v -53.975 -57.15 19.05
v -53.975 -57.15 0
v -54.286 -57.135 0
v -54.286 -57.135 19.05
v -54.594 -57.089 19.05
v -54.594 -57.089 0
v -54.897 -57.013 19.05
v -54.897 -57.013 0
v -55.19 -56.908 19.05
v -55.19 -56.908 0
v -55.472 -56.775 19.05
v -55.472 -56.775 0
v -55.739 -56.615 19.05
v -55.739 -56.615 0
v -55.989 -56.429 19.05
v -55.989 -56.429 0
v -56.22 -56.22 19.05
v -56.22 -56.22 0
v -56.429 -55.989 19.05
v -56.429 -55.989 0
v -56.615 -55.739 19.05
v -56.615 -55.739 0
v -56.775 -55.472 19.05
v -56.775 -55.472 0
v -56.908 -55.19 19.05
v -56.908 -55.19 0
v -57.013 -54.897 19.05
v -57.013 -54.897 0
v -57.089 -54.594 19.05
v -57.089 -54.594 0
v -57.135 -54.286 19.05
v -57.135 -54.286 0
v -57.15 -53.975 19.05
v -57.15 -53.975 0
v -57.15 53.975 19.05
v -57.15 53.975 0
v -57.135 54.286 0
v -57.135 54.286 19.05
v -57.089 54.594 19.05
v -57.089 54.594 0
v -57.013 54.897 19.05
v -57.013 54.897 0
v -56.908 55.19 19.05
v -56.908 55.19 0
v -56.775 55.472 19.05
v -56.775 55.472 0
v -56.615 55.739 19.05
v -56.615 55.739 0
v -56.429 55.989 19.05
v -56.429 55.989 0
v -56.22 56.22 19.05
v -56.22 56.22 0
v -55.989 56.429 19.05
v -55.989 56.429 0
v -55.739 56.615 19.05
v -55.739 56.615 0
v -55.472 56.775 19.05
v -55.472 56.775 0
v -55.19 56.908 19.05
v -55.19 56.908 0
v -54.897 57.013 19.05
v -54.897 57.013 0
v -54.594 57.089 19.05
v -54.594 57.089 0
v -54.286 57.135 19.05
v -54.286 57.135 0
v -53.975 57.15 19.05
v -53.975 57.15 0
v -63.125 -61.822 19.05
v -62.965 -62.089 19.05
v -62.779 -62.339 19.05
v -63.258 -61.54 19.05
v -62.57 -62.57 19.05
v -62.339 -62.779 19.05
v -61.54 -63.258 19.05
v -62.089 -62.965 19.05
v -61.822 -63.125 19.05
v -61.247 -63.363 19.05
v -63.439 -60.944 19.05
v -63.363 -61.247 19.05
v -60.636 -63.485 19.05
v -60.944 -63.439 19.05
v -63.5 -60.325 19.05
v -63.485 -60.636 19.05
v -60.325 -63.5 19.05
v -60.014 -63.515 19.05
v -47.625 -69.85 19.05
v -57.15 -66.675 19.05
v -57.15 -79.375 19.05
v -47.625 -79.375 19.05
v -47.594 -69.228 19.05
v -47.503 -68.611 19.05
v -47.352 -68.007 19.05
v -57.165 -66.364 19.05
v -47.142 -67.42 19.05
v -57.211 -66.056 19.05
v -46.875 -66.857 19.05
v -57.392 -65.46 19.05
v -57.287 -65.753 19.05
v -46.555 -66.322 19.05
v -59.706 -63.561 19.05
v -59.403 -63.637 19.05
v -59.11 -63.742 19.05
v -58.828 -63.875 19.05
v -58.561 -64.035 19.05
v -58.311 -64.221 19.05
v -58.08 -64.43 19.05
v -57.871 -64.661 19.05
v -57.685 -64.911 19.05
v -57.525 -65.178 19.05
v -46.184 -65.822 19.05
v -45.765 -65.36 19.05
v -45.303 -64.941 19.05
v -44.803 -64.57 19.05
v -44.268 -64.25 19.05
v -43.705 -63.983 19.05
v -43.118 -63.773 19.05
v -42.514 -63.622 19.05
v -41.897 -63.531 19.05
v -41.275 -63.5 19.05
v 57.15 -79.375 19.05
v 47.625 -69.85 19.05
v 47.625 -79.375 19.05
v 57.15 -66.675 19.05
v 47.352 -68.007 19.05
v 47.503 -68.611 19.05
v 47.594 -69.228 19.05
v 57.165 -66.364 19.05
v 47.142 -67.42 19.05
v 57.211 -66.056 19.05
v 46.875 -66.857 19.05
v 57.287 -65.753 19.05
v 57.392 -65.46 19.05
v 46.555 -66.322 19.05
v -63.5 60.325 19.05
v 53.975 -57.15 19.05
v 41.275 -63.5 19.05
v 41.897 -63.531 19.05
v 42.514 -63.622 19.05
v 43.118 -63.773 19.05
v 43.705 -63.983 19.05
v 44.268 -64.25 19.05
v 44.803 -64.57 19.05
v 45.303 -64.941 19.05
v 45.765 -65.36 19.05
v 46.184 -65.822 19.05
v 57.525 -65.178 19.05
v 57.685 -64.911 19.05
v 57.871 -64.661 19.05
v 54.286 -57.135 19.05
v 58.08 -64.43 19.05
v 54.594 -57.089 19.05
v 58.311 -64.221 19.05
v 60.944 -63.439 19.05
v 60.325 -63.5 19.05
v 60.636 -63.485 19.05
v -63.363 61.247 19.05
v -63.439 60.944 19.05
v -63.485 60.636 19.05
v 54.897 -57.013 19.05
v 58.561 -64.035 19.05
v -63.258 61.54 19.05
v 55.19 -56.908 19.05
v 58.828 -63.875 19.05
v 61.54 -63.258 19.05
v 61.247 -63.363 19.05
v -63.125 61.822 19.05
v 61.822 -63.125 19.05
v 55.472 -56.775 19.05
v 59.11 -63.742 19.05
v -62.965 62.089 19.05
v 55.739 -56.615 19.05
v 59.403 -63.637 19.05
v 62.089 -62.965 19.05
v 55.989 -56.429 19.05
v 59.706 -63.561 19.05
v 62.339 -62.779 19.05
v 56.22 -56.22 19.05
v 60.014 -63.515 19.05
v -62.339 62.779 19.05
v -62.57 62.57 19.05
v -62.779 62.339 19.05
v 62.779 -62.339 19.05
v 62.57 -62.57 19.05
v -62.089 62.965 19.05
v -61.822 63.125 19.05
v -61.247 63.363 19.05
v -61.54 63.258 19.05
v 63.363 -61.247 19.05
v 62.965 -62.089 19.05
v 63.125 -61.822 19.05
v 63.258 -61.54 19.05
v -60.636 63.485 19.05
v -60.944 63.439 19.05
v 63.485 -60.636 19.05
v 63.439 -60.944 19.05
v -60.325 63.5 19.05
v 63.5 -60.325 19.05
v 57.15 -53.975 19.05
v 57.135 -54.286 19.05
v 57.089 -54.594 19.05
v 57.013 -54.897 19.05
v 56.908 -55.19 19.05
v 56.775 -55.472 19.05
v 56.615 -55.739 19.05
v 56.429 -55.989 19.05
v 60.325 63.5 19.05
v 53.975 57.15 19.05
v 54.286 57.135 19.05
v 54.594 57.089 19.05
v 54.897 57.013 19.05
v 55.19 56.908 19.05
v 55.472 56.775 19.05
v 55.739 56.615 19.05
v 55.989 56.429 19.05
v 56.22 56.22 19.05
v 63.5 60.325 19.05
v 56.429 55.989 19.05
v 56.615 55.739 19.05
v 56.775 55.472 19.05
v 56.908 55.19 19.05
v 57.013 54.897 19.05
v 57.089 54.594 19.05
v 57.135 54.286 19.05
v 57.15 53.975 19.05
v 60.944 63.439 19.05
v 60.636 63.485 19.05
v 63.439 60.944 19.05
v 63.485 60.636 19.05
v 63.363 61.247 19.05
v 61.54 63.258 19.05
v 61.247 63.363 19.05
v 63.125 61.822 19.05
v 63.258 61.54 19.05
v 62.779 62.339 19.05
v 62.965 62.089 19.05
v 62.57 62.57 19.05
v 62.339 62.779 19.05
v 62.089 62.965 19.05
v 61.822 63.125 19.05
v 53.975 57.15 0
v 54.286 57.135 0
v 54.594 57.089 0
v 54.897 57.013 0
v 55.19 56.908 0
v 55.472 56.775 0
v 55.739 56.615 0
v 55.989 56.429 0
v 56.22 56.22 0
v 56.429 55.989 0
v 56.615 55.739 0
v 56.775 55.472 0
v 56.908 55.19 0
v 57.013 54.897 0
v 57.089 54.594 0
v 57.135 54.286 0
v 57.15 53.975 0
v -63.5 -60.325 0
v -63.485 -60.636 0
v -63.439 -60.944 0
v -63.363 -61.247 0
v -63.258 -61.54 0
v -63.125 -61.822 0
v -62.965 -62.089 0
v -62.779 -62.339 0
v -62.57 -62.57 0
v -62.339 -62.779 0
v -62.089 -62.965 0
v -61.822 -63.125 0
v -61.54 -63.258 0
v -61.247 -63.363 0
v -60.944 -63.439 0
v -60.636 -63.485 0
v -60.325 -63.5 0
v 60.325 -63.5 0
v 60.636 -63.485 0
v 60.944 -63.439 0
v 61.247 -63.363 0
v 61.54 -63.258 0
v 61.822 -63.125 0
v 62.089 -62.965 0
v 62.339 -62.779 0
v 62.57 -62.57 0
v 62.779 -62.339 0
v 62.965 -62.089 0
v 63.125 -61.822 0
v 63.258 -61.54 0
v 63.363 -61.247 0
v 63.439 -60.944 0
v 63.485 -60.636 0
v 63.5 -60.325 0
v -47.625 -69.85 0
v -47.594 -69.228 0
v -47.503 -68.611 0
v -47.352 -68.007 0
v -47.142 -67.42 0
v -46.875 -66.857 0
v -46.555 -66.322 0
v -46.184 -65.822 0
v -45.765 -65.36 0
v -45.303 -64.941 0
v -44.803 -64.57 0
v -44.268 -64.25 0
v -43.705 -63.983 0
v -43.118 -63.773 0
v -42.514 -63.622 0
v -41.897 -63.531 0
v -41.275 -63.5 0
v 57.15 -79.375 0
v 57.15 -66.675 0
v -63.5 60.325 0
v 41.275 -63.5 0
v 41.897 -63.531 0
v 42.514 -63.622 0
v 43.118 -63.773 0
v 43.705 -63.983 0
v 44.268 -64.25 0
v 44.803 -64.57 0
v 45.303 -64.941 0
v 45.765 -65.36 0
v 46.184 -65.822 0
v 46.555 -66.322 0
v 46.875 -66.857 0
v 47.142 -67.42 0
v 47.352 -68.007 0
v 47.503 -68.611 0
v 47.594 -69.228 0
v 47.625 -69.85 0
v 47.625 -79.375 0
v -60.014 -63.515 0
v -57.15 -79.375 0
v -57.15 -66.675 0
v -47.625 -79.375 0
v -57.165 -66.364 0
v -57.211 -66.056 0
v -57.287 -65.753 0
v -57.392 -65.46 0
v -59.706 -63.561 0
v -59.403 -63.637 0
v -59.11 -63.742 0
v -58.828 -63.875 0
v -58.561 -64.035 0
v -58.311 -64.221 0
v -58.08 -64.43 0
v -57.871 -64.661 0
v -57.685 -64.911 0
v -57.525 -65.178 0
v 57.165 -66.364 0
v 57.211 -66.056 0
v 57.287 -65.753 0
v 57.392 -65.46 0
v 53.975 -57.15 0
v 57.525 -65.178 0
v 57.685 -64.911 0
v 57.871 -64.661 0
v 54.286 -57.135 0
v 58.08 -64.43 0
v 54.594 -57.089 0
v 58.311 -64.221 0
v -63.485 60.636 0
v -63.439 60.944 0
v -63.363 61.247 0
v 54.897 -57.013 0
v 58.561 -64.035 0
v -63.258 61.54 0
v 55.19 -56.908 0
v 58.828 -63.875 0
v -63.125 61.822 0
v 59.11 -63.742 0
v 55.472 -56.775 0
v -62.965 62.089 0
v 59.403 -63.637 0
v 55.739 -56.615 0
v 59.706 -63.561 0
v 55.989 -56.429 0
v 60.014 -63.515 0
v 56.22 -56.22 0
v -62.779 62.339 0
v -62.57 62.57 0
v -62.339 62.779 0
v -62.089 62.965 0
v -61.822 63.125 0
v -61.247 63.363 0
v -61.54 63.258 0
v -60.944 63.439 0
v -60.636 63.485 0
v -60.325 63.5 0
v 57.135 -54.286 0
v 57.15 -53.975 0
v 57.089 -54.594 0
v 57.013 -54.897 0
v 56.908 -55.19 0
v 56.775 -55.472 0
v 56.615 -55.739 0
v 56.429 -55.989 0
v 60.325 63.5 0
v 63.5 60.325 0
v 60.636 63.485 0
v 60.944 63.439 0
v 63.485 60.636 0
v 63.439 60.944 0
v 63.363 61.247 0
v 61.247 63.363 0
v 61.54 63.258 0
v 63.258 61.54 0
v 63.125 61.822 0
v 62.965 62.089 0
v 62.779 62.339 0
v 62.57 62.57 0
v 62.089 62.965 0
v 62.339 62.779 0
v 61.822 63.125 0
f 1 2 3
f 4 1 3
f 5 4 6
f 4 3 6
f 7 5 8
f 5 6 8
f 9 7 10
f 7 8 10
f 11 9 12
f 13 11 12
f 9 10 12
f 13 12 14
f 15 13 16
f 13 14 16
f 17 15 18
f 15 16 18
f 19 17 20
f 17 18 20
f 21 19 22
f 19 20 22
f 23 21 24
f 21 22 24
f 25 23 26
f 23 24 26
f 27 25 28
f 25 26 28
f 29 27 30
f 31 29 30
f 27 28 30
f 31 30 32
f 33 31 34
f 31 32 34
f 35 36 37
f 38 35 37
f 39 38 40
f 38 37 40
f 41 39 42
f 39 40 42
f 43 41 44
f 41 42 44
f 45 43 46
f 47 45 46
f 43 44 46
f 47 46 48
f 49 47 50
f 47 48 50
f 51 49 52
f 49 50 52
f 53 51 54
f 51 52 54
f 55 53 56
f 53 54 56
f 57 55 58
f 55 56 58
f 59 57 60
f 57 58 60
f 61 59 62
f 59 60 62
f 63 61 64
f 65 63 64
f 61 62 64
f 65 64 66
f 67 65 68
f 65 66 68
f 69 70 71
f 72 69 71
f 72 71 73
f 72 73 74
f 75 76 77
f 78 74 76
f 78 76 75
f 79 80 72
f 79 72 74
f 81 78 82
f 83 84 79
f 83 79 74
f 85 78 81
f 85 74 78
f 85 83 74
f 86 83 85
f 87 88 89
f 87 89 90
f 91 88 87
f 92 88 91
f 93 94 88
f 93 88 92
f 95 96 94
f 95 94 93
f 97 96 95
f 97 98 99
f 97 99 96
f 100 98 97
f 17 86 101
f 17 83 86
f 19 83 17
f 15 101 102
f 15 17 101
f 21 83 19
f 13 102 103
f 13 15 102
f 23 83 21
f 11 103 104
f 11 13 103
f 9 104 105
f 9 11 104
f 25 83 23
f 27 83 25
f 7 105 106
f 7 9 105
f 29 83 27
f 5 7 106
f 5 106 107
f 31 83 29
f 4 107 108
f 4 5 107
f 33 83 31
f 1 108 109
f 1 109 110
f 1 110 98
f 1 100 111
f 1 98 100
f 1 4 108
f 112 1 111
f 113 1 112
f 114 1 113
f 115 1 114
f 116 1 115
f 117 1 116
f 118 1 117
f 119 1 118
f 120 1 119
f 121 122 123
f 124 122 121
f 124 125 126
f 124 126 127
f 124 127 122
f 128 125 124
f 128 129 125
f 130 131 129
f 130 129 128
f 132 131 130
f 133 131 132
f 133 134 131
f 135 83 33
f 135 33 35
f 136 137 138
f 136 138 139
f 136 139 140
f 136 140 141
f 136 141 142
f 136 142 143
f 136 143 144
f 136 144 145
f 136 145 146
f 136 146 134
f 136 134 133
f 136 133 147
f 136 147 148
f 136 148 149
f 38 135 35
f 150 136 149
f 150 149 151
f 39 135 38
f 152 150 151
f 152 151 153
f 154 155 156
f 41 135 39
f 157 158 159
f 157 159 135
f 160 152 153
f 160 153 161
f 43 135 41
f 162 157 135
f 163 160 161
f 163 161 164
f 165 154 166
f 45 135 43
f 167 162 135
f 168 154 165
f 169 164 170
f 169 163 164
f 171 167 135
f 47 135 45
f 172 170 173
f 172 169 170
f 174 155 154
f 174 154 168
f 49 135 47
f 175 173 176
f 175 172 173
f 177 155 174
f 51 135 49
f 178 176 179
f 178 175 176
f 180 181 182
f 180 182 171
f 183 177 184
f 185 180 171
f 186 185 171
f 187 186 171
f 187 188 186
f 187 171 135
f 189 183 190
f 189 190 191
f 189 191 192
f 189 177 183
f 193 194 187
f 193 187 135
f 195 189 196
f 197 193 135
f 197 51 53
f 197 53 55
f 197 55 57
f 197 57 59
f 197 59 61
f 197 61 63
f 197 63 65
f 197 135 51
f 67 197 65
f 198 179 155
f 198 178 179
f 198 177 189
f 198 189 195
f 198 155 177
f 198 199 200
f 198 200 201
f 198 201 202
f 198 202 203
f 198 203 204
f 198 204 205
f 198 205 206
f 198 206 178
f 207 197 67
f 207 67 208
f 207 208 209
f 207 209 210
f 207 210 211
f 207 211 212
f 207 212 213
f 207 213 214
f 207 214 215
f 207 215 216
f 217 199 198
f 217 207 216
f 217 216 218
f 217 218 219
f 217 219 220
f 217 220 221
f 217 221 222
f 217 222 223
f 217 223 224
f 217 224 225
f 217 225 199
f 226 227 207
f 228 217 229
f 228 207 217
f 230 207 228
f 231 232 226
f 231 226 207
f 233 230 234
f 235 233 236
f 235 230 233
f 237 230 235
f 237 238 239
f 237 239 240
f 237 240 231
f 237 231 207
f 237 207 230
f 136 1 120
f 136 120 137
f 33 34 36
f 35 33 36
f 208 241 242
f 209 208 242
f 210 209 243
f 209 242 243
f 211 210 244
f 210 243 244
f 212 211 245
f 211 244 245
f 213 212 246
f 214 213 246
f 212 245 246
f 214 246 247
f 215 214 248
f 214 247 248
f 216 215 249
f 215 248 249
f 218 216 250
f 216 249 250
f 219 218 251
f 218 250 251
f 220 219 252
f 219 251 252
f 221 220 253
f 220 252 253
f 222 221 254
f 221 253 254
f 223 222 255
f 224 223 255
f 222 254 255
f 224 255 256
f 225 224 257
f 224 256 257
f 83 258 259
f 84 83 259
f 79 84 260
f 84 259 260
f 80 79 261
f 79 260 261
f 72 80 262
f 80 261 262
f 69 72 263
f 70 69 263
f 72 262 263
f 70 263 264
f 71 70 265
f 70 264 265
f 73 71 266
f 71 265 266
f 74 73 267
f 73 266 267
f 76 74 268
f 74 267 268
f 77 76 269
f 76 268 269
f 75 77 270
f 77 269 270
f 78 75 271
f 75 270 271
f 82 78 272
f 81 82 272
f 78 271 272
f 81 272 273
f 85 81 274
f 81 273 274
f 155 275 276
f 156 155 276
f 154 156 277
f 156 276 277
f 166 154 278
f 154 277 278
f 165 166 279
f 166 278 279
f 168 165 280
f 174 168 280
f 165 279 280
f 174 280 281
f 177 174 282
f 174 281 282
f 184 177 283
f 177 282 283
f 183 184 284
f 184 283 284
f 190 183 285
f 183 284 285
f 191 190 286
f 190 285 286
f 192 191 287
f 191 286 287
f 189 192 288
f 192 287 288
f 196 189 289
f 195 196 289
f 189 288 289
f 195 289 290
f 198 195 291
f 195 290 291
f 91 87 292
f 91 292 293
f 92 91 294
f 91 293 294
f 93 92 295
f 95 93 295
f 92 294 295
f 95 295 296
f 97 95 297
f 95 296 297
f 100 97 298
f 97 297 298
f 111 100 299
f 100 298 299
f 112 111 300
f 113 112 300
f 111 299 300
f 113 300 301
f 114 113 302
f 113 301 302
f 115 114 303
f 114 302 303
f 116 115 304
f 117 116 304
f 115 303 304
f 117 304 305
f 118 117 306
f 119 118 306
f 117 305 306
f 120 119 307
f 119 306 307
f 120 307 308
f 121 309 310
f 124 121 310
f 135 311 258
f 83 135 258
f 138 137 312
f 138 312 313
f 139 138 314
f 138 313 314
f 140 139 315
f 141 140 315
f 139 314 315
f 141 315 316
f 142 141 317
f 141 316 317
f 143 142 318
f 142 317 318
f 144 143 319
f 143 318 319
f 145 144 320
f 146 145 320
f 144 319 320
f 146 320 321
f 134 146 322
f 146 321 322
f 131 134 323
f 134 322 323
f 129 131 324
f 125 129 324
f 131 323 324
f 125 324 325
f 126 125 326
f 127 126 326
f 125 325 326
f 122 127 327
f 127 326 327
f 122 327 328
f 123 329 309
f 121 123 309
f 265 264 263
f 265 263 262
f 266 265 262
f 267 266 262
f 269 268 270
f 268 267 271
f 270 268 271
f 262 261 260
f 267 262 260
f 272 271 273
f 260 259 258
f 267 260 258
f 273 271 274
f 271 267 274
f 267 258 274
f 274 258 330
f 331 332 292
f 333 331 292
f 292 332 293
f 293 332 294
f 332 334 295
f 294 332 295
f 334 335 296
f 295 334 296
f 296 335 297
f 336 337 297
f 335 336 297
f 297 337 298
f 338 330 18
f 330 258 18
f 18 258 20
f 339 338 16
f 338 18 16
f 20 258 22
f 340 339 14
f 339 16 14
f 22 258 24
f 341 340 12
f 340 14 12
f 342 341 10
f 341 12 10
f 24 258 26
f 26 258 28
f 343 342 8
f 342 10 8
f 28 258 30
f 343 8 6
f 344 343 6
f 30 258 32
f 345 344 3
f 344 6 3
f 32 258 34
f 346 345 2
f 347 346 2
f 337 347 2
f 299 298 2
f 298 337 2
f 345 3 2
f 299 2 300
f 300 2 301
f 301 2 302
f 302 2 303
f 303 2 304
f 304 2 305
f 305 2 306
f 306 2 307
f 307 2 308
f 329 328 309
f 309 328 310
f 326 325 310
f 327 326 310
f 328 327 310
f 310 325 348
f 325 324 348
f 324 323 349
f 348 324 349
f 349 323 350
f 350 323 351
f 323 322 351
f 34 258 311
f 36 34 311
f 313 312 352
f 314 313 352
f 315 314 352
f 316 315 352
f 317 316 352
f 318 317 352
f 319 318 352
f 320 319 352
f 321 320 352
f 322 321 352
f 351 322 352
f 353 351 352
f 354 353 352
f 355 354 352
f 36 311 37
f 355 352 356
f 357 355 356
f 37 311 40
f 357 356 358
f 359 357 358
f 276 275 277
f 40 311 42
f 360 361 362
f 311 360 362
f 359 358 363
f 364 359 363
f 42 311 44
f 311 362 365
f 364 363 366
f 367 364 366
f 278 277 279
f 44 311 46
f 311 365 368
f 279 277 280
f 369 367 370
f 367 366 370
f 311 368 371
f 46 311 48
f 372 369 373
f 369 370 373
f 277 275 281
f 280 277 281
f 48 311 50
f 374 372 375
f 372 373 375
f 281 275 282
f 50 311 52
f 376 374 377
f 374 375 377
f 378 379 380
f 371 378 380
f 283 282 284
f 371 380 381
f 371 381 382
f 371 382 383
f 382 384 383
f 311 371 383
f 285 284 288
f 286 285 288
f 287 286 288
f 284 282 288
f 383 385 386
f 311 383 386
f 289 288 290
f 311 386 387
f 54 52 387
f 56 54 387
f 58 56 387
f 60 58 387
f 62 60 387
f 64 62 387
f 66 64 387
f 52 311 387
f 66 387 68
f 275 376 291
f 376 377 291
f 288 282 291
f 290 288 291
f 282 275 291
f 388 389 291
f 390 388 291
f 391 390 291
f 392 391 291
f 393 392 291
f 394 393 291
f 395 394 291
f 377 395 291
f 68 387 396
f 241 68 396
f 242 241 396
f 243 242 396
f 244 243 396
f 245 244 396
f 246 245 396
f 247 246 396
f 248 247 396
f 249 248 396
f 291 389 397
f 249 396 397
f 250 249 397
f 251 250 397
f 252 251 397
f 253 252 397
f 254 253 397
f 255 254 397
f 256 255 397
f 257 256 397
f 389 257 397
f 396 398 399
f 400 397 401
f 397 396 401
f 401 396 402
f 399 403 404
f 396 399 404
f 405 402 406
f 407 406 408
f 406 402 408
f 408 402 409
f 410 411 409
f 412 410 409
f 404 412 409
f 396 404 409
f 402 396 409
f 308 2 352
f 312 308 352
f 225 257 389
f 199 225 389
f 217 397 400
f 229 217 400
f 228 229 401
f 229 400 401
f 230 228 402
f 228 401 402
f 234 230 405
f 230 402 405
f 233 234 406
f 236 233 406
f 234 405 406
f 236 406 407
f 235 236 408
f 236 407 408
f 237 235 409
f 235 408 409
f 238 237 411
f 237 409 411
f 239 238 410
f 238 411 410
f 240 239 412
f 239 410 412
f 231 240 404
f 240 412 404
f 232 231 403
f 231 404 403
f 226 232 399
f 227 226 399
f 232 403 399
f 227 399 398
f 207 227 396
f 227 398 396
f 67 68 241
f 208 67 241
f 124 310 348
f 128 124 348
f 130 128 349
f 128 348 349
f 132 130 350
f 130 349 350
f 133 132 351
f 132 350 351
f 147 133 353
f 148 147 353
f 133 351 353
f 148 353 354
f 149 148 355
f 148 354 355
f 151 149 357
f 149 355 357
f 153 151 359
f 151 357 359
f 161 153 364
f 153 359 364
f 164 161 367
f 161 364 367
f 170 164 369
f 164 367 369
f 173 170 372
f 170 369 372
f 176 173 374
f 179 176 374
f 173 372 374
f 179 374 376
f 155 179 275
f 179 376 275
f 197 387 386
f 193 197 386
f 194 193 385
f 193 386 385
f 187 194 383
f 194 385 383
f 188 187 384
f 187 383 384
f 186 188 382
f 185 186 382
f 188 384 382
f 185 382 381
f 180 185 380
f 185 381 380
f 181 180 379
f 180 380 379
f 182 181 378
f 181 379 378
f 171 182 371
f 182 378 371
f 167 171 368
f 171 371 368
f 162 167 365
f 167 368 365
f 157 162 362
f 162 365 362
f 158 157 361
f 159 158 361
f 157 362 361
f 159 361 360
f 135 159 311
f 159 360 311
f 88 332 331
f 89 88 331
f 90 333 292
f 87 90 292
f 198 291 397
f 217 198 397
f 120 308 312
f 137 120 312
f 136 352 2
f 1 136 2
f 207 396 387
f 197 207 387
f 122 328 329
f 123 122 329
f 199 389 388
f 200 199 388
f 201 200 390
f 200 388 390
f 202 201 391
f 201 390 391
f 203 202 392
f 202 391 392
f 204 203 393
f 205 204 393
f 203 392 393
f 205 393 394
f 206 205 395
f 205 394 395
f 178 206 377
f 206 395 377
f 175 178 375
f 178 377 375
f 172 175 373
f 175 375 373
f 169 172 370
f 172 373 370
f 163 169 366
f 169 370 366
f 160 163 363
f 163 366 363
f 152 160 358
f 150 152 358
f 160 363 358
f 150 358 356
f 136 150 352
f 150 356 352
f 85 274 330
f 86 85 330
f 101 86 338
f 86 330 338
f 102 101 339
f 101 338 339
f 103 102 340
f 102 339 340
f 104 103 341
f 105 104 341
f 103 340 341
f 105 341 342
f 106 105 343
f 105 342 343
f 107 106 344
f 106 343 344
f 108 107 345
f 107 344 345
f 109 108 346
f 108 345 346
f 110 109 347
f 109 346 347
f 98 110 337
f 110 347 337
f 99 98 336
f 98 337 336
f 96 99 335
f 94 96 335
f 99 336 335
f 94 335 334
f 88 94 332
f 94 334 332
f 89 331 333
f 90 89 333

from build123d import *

# Parameters (mm, degrees)
F1_DEPTH = 19.05


with BuildPart() as f1:
    # F0 (on Top) → F1 (new body)
    with BuildSketch(Plane.XY):
        with BuildLine():
            Line((60.325, 63.5), (-60.325, 63.5))
            ThreePointArc((-60.325, 63.5), (-62.570064, 62.570064), (-63.5, 60.325))
            Line((-63.5, 60.325), (-63.5, -60.325))
            ThreePointArc((-63.5, -60.325), (-62.570064, -62.570064), (-60.325, -63.5))
            ThreePointArc((-60.325, -63.5), (-58.079936, -64.429936), (-57.15, -66.675))
            Line((-57.15, -66.675), (-57.15, -79.375))
            Line((-57.15, -79.375), (-47.625, -79.375))
            Line((-47.625, -79.375), (-47.625, -69.85))
            ThreePointArc((-47.625, -69.85), (-45.765128, -65.359872), (-41.275, -63.5))
            Line((-41.275, -63.5), (41.275, -63.5))
            ThreePointArc((41.275, -63.5), (45.765128, -65.359872), (47.625, -69.85))
            Line((47.625, -69.85), (47.625, -79.375))
            Line((47.625, -79.375), (57.15, -79.375))
            Line((57.15, -79.375), (57.15, -66.675))
            ThreePointArc((57.15, -66.675), (58.079936, -64.429936), (60.325, -63.5))
            ThreePointArc((60.325, -63.5), (62.570064, -62.570064), (63.5, -60.325))
            Line((63.5, -60.325), (63.5, 60.325))
            ThreePointArc((63.5, 60.325), (62.570064, 62.570064), (60.325, 63.5))
        make_face()
        with BuildLine():
            ThreePointArc((-57.15, 53.975), (-56.220064, 56.220064), (-53.975, 57.15))
            Line((-53.975, 57.15), (53.975, 57.15))
            ThreePointArc((53.975, 57.15), (56.220064, 56.220064), (57.15, 53.975))
            Line((57.15, 53.975), (57.15, -53.975))
            ThreePointArc((57.15, -53.975), (56.220064, -56.220064), (53.975, -57.15))
            Line((53.975, -57.15), (-53.975, -57.15))
            ThreePointArc((-53.975, -57.15), (-56.220064, -56.220064), (-57.15, -53.975))
            Line((-57.15, -53.975), (-57.15, 53.975))
        make_face(mode=Mode.SUBTRACT)
    extrude(amount=F1_DEPTH)


solid = f1.part
